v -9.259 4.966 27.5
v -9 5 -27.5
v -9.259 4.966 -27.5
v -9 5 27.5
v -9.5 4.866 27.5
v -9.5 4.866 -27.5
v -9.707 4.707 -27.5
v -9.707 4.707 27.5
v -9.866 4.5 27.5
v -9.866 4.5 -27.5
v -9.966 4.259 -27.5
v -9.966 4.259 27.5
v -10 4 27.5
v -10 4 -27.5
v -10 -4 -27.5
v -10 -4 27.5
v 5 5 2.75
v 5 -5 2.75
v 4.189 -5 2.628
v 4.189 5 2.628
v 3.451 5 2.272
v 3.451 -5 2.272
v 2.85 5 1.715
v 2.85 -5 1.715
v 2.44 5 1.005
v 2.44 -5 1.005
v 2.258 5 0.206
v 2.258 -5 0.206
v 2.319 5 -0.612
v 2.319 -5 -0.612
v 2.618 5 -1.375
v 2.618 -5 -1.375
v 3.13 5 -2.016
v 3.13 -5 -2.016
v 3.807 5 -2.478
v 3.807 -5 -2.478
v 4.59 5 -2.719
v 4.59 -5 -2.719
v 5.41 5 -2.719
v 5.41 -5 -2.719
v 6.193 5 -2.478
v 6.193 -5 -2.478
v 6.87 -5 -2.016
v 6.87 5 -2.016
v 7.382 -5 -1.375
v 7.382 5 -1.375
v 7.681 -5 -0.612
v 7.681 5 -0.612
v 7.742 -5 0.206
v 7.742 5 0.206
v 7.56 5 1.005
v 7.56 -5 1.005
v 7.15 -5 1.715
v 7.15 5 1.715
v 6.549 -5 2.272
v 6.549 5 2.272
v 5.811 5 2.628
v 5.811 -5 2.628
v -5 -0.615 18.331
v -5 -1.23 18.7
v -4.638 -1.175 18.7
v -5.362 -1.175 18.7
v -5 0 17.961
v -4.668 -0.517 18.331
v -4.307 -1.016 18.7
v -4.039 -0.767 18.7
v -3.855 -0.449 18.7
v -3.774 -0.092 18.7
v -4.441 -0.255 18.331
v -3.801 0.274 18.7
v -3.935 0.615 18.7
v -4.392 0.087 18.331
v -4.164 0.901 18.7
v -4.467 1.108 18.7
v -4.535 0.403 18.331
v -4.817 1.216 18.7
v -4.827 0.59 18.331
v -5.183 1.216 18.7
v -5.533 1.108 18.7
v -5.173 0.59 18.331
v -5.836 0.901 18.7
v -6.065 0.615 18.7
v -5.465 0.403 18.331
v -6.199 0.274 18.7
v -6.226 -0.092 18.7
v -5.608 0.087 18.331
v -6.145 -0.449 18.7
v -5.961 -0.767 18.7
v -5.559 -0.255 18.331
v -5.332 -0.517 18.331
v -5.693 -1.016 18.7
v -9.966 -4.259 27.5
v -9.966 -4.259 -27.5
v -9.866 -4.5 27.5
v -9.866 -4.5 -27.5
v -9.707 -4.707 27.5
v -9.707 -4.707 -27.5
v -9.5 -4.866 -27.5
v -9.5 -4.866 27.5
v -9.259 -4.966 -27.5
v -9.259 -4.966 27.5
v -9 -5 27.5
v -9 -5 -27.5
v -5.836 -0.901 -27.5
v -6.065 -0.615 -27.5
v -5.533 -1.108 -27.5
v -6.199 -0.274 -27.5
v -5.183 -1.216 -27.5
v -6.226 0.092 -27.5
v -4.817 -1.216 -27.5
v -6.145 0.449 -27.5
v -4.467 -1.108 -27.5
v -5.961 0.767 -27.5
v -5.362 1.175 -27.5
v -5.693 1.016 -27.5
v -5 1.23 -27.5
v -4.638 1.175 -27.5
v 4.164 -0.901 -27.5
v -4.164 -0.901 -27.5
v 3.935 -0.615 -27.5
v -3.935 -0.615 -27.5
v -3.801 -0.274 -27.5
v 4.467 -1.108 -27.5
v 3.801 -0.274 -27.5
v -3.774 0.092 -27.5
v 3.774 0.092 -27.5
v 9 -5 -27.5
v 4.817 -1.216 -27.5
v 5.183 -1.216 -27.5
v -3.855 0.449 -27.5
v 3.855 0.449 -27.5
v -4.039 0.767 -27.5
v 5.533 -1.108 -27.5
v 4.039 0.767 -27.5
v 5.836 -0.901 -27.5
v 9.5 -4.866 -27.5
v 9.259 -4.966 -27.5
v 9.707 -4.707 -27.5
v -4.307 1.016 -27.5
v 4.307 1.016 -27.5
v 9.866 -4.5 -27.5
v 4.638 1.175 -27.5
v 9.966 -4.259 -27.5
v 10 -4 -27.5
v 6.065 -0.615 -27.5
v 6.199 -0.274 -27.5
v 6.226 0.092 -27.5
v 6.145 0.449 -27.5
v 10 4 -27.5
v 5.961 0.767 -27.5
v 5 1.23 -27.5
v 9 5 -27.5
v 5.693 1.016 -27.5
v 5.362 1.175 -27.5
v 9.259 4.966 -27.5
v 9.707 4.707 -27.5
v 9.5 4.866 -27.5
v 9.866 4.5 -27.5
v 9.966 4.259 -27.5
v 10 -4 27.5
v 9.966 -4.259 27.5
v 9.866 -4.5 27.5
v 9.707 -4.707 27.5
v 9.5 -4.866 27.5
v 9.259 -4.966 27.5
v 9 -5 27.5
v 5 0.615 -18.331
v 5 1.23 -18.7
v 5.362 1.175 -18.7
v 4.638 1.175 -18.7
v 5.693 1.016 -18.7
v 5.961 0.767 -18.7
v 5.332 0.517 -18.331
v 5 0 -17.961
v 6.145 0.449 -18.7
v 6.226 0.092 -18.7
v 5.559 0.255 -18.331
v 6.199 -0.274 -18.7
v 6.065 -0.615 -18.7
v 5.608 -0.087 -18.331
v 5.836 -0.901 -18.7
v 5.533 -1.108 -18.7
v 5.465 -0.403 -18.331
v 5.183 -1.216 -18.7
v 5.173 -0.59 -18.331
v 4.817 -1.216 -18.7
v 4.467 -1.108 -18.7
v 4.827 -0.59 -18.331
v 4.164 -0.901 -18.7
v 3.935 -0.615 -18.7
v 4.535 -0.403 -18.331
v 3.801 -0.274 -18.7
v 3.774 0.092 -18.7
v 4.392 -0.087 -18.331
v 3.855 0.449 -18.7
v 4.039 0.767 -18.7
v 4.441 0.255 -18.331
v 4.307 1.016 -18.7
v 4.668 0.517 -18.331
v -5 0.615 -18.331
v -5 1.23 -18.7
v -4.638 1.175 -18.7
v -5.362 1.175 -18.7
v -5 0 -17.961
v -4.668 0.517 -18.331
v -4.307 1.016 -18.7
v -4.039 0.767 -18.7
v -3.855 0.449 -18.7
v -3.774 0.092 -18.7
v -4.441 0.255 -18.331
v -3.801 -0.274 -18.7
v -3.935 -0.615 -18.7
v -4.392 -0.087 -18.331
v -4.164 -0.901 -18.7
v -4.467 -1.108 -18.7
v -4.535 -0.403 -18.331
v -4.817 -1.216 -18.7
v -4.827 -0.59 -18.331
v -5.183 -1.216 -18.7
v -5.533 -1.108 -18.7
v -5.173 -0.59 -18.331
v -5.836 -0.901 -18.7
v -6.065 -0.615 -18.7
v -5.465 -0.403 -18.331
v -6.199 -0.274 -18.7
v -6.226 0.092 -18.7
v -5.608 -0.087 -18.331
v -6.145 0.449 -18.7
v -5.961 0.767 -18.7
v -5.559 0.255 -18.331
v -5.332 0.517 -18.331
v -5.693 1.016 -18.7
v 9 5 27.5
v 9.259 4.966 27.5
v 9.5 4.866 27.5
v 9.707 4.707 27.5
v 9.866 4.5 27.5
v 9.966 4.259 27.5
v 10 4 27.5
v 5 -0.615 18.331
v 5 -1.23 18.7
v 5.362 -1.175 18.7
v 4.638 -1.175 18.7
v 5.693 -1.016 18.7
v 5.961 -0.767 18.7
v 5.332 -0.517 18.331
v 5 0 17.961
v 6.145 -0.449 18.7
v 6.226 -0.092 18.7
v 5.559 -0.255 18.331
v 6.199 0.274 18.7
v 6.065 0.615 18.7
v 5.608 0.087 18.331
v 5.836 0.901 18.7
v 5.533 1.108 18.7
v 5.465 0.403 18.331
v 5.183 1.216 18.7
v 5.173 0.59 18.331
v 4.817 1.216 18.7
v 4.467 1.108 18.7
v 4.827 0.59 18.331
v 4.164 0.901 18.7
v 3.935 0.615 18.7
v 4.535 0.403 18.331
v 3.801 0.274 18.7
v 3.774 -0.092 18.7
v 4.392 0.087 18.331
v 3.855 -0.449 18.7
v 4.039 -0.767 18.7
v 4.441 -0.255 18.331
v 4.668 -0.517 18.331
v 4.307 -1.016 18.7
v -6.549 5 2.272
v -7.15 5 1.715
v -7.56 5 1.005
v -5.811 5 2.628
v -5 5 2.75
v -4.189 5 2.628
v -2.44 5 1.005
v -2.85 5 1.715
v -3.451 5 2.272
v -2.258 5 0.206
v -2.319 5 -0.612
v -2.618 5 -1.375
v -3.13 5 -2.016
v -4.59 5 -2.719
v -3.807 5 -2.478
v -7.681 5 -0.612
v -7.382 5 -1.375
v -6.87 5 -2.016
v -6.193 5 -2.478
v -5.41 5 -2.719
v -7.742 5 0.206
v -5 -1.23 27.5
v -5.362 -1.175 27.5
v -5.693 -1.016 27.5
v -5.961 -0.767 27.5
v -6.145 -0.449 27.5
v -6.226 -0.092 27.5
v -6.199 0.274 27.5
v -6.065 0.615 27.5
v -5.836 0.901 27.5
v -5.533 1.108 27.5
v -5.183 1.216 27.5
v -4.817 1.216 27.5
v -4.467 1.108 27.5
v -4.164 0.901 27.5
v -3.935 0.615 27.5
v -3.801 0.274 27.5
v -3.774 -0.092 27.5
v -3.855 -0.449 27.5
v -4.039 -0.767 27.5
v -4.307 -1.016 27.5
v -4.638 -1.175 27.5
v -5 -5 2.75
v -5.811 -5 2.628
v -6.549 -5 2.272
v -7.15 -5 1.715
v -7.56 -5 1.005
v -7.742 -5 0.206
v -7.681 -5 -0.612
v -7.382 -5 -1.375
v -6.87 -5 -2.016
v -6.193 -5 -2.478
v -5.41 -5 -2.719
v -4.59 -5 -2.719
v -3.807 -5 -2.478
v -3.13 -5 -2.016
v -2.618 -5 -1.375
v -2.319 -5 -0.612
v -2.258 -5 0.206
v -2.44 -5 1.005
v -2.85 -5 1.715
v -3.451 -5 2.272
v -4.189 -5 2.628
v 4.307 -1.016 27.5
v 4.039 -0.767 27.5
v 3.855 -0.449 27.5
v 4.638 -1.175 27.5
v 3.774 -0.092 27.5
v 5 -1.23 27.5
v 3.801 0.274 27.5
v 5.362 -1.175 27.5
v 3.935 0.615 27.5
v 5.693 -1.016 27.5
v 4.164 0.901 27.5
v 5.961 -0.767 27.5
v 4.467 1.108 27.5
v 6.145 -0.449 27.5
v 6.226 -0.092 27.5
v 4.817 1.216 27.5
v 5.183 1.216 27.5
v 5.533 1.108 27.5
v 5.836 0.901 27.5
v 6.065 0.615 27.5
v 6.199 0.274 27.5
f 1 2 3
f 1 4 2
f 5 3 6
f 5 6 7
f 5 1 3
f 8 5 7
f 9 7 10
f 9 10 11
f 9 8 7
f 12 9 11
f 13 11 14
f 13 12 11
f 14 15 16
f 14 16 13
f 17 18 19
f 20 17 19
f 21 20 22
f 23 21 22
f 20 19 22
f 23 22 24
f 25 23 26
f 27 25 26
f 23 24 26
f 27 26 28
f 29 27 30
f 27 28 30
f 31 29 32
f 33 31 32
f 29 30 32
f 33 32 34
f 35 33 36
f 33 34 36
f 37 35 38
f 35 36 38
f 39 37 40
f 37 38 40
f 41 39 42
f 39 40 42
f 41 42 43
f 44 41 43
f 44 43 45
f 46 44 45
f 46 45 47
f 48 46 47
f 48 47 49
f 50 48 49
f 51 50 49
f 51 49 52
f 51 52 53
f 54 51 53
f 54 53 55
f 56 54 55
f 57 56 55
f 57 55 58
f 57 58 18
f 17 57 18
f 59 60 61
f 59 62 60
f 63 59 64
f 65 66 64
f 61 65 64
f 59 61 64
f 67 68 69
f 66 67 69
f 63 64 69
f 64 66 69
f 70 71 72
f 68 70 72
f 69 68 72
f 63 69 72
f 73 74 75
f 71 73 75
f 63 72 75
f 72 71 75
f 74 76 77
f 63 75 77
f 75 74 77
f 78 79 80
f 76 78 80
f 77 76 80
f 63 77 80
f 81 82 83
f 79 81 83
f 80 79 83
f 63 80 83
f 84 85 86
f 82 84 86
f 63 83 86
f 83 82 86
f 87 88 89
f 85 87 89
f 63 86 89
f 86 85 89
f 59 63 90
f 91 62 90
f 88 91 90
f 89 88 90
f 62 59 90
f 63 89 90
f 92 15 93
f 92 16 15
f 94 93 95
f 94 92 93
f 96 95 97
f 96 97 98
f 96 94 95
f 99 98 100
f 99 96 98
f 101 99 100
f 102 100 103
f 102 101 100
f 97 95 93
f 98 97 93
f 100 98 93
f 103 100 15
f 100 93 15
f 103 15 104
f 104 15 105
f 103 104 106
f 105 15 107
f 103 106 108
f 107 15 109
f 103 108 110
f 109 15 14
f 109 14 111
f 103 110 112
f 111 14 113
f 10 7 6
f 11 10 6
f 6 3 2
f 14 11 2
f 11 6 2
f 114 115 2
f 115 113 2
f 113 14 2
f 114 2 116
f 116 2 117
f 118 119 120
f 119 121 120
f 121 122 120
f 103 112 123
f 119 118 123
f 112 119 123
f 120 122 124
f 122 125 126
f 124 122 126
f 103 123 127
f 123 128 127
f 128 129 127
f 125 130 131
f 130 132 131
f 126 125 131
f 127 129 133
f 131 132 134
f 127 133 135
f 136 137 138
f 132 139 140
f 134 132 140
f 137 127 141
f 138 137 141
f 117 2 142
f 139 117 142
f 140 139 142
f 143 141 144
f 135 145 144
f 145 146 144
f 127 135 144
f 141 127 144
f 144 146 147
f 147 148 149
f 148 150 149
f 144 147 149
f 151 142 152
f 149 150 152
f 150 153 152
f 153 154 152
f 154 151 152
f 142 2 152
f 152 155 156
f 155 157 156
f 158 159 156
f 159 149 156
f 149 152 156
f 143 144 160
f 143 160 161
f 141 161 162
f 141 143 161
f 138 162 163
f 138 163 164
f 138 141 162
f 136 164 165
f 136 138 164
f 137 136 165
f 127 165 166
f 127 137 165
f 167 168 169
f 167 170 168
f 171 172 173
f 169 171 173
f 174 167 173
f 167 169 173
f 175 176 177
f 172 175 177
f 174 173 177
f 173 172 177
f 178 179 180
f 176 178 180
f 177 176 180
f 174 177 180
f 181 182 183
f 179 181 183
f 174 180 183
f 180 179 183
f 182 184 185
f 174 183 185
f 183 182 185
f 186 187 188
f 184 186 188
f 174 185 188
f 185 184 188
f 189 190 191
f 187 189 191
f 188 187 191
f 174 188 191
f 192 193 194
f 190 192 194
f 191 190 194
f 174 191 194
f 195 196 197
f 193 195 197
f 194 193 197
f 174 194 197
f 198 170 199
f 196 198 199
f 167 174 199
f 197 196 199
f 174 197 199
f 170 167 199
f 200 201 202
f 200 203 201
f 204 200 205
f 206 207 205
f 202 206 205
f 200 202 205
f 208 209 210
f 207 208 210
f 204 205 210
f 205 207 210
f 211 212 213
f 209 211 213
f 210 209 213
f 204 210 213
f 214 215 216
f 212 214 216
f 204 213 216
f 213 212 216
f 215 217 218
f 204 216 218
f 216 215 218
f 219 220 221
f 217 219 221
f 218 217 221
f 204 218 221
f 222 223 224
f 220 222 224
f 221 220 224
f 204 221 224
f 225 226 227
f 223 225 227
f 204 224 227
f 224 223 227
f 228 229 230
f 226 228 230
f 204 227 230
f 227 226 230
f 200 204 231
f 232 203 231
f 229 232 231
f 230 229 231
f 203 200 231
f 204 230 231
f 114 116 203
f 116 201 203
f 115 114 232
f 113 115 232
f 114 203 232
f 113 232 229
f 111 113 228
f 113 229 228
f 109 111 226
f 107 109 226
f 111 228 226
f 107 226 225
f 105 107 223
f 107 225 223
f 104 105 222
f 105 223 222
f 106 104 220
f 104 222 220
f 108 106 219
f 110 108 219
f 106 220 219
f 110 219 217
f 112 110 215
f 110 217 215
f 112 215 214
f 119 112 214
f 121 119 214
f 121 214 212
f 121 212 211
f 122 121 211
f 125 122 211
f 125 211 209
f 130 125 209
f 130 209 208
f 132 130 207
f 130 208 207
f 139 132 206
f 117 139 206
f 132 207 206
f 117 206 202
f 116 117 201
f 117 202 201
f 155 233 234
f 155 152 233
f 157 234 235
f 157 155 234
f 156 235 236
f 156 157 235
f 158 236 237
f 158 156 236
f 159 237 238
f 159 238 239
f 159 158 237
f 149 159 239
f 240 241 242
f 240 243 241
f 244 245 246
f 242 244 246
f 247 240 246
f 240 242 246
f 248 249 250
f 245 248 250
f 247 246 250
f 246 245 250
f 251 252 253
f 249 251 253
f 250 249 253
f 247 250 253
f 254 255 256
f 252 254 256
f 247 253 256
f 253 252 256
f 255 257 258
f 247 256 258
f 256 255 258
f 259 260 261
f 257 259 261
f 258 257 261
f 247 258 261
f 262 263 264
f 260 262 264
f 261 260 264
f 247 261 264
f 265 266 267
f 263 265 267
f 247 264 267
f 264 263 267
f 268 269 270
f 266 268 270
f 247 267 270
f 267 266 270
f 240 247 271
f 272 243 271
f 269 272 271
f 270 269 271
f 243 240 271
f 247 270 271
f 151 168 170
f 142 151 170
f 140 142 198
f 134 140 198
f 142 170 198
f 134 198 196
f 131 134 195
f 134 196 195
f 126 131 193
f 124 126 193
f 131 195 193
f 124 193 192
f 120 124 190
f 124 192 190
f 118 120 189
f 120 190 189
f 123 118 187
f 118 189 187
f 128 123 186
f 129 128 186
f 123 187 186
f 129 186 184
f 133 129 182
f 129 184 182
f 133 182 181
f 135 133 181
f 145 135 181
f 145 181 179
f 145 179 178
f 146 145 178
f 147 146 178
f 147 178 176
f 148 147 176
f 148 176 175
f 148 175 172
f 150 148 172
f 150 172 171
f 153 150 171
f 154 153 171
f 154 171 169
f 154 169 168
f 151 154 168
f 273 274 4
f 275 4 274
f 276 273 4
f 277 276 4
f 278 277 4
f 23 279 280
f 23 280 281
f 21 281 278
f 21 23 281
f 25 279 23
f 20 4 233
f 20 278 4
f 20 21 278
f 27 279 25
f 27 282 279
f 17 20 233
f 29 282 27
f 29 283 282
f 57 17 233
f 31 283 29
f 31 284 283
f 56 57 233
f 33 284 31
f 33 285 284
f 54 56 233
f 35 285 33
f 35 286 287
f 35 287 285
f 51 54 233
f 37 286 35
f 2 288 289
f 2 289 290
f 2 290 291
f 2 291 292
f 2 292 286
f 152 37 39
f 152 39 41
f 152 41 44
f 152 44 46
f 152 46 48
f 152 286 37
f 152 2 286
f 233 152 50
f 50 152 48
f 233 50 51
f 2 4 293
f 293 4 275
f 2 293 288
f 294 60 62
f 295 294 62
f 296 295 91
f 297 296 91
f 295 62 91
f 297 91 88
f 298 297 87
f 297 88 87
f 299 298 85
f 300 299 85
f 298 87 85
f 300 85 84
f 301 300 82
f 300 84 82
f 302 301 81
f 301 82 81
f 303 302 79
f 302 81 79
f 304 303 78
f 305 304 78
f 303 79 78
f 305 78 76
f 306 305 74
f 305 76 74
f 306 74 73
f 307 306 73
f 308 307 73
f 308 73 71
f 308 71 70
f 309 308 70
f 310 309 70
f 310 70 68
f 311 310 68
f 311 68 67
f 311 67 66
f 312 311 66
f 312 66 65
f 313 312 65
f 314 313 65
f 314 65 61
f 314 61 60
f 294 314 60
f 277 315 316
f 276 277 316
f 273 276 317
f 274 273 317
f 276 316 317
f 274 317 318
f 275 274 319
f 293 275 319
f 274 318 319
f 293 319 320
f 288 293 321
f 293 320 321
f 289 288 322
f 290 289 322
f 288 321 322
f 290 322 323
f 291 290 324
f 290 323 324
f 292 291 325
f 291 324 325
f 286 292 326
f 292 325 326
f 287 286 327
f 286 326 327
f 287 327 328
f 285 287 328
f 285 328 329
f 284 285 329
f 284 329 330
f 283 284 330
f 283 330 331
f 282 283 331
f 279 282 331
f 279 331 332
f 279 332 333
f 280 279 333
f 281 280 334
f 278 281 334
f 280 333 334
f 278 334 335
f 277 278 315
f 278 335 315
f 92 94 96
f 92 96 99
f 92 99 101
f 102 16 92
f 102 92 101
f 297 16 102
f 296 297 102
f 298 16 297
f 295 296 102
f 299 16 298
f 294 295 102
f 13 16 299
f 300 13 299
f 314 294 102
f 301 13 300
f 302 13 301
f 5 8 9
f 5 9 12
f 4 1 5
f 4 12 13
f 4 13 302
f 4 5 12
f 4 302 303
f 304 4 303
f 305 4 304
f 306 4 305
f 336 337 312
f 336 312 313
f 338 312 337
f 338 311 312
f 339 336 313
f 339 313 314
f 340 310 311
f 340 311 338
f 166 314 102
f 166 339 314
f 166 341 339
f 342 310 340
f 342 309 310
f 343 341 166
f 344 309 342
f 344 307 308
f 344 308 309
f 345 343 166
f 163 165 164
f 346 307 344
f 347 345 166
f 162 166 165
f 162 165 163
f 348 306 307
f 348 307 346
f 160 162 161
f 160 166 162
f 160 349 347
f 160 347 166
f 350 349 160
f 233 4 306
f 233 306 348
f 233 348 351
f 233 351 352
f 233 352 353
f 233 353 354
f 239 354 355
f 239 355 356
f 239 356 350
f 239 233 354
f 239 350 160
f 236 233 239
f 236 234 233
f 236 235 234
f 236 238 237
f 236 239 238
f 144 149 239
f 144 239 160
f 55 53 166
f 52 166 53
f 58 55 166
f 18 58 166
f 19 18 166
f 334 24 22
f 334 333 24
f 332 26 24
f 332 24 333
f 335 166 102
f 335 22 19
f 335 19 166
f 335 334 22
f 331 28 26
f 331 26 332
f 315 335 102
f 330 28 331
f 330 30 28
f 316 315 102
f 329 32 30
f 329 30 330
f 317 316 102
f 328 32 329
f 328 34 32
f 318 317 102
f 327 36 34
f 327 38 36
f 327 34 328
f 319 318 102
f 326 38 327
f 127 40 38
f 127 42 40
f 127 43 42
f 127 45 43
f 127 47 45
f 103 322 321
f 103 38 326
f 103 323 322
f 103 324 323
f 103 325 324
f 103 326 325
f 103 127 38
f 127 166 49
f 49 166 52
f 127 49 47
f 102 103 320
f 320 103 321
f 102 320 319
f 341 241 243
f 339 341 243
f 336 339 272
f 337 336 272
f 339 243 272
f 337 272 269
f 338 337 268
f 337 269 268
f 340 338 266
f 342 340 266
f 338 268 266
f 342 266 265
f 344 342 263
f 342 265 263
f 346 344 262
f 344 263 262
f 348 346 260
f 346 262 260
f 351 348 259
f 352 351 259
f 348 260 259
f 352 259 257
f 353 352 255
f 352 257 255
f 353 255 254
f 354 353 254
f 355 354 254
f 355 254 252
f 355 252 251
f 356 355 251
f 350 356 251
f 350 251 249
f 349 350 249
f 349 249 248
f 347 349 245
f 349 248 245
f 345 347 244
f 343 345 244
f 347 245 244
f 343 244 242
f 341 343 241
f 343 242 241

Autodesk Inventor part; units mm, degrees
ref_plane "YZ Plane" through (0, 0, 0) normal (1, 0, 0) x (0, 1, 0)
ref_plane "XZ Plane" through (0, 0, 0) normal (0, 1, 0) x (-1, 0, 0)
ref_plane "XY Plane" through (0, 0, 0) normal (0, 0, 1) x (1, 0, 0)
sketch "スケッチ1" plane through (0, 0, 0) normal (0, 0, 1) x (1, 0, 0)
  line L0 (-10, 5) -> (10, 5)
  line L1 (10, 5) -> (10, -5)
  line L2 (10, -5) -> (-10, -5)
  line L3 (-10, -5) -> (-10, 5)
  line L4 (-10, 5) -> (10, -5) construction
  line L5 (10, 5) -> (-10, -5) construction
  point P0 (0, 0)
  dimension "d0" = 20
  dimension "d1" = 10
extrude "押し出し1" add sketch "スケッチ1" along normal mid plane 55
sketch "スケッチ2" plane through (0, 0, 27.5) normal (0, 0, 1) x (1, 0, 0)
  line L0 (-10, -5) -> (10, -5) projected
  line L1 (-10, 5) -> (-10, -5) projected
  line L2 (10, -5) -> (10, 5) projected
  point P0 (0, 0)
  point P1 (-5, 0)
  point P2 (5, 0)
  dimension "d4" = 5
  dimension "d5" = 5
  dimension "d6" = 5
  dimension "d7" = 5
hole "穴1" at (-5, 0, 27.5) at (5, 0, 27.5) direction (0, 0, -1) diameter 2.459 depth 8.8 tip angle 118 thread size "M3x0.5" class "6H" standard "ISO Metric profile"
sketch "スケッチ3" plane through (0, 0, -27.5) normal (0, 0, -1) x (-1, 0, 0)
  line L0 (-10, -5) -> (10, -5) projected
  line L1 (10, -5) -> (10, 5) projected
  line L2 (10, 5) -> (-10, 5) projected
  line L3 (-10, 5) -> (-10, -5) projected
  circle A0 centre (-5, 0) radius 1.2295 projected
  circle A1 centre (5, 0) radius 1.2295 projected
  point P0 (0, 0)
hole "穴2" at (5, 0, -27.5) at (-5, 0, -27.5) direction (0, 0, 1) diameter 2.459 depth 8.8 tip angle 118 thread size "M3x0.5" class "6H" standard "ISO Metric profile"
sketch "スケッチ5" plane through (-10, 5, 27.5) normal (0, 1, 0) x (1, 0, 0)
  line L0 (20, 55) -> (20, 0) projected
  line L1 (0, 55) -> (20, 55) projected
  point P0 (10, 27.5)
  point P1 (15, 27.5)
  point P2 (5, 27.5)
  dimension "d22" = 5
  dimension "d23" = 10
  dimension "d24" = 27.5
  dimension "d25" = 27.5
hole "穴3" at (5, 5, 0) at (-5, 5, 0) direction (0, -1, 0) diameter 5.5 end through all
fillet "フィレット1" radius 1 4 edges at (-10, 5, 0) (10, 5, 0) (10, -5, 0) (-10, -5, 0)
equation "\"d5\" = d4"
equation "\"d6\" = d4"
equation "\"d7\" = d5"
equation "\"d25\" = d24"
properties part number "center_part"
